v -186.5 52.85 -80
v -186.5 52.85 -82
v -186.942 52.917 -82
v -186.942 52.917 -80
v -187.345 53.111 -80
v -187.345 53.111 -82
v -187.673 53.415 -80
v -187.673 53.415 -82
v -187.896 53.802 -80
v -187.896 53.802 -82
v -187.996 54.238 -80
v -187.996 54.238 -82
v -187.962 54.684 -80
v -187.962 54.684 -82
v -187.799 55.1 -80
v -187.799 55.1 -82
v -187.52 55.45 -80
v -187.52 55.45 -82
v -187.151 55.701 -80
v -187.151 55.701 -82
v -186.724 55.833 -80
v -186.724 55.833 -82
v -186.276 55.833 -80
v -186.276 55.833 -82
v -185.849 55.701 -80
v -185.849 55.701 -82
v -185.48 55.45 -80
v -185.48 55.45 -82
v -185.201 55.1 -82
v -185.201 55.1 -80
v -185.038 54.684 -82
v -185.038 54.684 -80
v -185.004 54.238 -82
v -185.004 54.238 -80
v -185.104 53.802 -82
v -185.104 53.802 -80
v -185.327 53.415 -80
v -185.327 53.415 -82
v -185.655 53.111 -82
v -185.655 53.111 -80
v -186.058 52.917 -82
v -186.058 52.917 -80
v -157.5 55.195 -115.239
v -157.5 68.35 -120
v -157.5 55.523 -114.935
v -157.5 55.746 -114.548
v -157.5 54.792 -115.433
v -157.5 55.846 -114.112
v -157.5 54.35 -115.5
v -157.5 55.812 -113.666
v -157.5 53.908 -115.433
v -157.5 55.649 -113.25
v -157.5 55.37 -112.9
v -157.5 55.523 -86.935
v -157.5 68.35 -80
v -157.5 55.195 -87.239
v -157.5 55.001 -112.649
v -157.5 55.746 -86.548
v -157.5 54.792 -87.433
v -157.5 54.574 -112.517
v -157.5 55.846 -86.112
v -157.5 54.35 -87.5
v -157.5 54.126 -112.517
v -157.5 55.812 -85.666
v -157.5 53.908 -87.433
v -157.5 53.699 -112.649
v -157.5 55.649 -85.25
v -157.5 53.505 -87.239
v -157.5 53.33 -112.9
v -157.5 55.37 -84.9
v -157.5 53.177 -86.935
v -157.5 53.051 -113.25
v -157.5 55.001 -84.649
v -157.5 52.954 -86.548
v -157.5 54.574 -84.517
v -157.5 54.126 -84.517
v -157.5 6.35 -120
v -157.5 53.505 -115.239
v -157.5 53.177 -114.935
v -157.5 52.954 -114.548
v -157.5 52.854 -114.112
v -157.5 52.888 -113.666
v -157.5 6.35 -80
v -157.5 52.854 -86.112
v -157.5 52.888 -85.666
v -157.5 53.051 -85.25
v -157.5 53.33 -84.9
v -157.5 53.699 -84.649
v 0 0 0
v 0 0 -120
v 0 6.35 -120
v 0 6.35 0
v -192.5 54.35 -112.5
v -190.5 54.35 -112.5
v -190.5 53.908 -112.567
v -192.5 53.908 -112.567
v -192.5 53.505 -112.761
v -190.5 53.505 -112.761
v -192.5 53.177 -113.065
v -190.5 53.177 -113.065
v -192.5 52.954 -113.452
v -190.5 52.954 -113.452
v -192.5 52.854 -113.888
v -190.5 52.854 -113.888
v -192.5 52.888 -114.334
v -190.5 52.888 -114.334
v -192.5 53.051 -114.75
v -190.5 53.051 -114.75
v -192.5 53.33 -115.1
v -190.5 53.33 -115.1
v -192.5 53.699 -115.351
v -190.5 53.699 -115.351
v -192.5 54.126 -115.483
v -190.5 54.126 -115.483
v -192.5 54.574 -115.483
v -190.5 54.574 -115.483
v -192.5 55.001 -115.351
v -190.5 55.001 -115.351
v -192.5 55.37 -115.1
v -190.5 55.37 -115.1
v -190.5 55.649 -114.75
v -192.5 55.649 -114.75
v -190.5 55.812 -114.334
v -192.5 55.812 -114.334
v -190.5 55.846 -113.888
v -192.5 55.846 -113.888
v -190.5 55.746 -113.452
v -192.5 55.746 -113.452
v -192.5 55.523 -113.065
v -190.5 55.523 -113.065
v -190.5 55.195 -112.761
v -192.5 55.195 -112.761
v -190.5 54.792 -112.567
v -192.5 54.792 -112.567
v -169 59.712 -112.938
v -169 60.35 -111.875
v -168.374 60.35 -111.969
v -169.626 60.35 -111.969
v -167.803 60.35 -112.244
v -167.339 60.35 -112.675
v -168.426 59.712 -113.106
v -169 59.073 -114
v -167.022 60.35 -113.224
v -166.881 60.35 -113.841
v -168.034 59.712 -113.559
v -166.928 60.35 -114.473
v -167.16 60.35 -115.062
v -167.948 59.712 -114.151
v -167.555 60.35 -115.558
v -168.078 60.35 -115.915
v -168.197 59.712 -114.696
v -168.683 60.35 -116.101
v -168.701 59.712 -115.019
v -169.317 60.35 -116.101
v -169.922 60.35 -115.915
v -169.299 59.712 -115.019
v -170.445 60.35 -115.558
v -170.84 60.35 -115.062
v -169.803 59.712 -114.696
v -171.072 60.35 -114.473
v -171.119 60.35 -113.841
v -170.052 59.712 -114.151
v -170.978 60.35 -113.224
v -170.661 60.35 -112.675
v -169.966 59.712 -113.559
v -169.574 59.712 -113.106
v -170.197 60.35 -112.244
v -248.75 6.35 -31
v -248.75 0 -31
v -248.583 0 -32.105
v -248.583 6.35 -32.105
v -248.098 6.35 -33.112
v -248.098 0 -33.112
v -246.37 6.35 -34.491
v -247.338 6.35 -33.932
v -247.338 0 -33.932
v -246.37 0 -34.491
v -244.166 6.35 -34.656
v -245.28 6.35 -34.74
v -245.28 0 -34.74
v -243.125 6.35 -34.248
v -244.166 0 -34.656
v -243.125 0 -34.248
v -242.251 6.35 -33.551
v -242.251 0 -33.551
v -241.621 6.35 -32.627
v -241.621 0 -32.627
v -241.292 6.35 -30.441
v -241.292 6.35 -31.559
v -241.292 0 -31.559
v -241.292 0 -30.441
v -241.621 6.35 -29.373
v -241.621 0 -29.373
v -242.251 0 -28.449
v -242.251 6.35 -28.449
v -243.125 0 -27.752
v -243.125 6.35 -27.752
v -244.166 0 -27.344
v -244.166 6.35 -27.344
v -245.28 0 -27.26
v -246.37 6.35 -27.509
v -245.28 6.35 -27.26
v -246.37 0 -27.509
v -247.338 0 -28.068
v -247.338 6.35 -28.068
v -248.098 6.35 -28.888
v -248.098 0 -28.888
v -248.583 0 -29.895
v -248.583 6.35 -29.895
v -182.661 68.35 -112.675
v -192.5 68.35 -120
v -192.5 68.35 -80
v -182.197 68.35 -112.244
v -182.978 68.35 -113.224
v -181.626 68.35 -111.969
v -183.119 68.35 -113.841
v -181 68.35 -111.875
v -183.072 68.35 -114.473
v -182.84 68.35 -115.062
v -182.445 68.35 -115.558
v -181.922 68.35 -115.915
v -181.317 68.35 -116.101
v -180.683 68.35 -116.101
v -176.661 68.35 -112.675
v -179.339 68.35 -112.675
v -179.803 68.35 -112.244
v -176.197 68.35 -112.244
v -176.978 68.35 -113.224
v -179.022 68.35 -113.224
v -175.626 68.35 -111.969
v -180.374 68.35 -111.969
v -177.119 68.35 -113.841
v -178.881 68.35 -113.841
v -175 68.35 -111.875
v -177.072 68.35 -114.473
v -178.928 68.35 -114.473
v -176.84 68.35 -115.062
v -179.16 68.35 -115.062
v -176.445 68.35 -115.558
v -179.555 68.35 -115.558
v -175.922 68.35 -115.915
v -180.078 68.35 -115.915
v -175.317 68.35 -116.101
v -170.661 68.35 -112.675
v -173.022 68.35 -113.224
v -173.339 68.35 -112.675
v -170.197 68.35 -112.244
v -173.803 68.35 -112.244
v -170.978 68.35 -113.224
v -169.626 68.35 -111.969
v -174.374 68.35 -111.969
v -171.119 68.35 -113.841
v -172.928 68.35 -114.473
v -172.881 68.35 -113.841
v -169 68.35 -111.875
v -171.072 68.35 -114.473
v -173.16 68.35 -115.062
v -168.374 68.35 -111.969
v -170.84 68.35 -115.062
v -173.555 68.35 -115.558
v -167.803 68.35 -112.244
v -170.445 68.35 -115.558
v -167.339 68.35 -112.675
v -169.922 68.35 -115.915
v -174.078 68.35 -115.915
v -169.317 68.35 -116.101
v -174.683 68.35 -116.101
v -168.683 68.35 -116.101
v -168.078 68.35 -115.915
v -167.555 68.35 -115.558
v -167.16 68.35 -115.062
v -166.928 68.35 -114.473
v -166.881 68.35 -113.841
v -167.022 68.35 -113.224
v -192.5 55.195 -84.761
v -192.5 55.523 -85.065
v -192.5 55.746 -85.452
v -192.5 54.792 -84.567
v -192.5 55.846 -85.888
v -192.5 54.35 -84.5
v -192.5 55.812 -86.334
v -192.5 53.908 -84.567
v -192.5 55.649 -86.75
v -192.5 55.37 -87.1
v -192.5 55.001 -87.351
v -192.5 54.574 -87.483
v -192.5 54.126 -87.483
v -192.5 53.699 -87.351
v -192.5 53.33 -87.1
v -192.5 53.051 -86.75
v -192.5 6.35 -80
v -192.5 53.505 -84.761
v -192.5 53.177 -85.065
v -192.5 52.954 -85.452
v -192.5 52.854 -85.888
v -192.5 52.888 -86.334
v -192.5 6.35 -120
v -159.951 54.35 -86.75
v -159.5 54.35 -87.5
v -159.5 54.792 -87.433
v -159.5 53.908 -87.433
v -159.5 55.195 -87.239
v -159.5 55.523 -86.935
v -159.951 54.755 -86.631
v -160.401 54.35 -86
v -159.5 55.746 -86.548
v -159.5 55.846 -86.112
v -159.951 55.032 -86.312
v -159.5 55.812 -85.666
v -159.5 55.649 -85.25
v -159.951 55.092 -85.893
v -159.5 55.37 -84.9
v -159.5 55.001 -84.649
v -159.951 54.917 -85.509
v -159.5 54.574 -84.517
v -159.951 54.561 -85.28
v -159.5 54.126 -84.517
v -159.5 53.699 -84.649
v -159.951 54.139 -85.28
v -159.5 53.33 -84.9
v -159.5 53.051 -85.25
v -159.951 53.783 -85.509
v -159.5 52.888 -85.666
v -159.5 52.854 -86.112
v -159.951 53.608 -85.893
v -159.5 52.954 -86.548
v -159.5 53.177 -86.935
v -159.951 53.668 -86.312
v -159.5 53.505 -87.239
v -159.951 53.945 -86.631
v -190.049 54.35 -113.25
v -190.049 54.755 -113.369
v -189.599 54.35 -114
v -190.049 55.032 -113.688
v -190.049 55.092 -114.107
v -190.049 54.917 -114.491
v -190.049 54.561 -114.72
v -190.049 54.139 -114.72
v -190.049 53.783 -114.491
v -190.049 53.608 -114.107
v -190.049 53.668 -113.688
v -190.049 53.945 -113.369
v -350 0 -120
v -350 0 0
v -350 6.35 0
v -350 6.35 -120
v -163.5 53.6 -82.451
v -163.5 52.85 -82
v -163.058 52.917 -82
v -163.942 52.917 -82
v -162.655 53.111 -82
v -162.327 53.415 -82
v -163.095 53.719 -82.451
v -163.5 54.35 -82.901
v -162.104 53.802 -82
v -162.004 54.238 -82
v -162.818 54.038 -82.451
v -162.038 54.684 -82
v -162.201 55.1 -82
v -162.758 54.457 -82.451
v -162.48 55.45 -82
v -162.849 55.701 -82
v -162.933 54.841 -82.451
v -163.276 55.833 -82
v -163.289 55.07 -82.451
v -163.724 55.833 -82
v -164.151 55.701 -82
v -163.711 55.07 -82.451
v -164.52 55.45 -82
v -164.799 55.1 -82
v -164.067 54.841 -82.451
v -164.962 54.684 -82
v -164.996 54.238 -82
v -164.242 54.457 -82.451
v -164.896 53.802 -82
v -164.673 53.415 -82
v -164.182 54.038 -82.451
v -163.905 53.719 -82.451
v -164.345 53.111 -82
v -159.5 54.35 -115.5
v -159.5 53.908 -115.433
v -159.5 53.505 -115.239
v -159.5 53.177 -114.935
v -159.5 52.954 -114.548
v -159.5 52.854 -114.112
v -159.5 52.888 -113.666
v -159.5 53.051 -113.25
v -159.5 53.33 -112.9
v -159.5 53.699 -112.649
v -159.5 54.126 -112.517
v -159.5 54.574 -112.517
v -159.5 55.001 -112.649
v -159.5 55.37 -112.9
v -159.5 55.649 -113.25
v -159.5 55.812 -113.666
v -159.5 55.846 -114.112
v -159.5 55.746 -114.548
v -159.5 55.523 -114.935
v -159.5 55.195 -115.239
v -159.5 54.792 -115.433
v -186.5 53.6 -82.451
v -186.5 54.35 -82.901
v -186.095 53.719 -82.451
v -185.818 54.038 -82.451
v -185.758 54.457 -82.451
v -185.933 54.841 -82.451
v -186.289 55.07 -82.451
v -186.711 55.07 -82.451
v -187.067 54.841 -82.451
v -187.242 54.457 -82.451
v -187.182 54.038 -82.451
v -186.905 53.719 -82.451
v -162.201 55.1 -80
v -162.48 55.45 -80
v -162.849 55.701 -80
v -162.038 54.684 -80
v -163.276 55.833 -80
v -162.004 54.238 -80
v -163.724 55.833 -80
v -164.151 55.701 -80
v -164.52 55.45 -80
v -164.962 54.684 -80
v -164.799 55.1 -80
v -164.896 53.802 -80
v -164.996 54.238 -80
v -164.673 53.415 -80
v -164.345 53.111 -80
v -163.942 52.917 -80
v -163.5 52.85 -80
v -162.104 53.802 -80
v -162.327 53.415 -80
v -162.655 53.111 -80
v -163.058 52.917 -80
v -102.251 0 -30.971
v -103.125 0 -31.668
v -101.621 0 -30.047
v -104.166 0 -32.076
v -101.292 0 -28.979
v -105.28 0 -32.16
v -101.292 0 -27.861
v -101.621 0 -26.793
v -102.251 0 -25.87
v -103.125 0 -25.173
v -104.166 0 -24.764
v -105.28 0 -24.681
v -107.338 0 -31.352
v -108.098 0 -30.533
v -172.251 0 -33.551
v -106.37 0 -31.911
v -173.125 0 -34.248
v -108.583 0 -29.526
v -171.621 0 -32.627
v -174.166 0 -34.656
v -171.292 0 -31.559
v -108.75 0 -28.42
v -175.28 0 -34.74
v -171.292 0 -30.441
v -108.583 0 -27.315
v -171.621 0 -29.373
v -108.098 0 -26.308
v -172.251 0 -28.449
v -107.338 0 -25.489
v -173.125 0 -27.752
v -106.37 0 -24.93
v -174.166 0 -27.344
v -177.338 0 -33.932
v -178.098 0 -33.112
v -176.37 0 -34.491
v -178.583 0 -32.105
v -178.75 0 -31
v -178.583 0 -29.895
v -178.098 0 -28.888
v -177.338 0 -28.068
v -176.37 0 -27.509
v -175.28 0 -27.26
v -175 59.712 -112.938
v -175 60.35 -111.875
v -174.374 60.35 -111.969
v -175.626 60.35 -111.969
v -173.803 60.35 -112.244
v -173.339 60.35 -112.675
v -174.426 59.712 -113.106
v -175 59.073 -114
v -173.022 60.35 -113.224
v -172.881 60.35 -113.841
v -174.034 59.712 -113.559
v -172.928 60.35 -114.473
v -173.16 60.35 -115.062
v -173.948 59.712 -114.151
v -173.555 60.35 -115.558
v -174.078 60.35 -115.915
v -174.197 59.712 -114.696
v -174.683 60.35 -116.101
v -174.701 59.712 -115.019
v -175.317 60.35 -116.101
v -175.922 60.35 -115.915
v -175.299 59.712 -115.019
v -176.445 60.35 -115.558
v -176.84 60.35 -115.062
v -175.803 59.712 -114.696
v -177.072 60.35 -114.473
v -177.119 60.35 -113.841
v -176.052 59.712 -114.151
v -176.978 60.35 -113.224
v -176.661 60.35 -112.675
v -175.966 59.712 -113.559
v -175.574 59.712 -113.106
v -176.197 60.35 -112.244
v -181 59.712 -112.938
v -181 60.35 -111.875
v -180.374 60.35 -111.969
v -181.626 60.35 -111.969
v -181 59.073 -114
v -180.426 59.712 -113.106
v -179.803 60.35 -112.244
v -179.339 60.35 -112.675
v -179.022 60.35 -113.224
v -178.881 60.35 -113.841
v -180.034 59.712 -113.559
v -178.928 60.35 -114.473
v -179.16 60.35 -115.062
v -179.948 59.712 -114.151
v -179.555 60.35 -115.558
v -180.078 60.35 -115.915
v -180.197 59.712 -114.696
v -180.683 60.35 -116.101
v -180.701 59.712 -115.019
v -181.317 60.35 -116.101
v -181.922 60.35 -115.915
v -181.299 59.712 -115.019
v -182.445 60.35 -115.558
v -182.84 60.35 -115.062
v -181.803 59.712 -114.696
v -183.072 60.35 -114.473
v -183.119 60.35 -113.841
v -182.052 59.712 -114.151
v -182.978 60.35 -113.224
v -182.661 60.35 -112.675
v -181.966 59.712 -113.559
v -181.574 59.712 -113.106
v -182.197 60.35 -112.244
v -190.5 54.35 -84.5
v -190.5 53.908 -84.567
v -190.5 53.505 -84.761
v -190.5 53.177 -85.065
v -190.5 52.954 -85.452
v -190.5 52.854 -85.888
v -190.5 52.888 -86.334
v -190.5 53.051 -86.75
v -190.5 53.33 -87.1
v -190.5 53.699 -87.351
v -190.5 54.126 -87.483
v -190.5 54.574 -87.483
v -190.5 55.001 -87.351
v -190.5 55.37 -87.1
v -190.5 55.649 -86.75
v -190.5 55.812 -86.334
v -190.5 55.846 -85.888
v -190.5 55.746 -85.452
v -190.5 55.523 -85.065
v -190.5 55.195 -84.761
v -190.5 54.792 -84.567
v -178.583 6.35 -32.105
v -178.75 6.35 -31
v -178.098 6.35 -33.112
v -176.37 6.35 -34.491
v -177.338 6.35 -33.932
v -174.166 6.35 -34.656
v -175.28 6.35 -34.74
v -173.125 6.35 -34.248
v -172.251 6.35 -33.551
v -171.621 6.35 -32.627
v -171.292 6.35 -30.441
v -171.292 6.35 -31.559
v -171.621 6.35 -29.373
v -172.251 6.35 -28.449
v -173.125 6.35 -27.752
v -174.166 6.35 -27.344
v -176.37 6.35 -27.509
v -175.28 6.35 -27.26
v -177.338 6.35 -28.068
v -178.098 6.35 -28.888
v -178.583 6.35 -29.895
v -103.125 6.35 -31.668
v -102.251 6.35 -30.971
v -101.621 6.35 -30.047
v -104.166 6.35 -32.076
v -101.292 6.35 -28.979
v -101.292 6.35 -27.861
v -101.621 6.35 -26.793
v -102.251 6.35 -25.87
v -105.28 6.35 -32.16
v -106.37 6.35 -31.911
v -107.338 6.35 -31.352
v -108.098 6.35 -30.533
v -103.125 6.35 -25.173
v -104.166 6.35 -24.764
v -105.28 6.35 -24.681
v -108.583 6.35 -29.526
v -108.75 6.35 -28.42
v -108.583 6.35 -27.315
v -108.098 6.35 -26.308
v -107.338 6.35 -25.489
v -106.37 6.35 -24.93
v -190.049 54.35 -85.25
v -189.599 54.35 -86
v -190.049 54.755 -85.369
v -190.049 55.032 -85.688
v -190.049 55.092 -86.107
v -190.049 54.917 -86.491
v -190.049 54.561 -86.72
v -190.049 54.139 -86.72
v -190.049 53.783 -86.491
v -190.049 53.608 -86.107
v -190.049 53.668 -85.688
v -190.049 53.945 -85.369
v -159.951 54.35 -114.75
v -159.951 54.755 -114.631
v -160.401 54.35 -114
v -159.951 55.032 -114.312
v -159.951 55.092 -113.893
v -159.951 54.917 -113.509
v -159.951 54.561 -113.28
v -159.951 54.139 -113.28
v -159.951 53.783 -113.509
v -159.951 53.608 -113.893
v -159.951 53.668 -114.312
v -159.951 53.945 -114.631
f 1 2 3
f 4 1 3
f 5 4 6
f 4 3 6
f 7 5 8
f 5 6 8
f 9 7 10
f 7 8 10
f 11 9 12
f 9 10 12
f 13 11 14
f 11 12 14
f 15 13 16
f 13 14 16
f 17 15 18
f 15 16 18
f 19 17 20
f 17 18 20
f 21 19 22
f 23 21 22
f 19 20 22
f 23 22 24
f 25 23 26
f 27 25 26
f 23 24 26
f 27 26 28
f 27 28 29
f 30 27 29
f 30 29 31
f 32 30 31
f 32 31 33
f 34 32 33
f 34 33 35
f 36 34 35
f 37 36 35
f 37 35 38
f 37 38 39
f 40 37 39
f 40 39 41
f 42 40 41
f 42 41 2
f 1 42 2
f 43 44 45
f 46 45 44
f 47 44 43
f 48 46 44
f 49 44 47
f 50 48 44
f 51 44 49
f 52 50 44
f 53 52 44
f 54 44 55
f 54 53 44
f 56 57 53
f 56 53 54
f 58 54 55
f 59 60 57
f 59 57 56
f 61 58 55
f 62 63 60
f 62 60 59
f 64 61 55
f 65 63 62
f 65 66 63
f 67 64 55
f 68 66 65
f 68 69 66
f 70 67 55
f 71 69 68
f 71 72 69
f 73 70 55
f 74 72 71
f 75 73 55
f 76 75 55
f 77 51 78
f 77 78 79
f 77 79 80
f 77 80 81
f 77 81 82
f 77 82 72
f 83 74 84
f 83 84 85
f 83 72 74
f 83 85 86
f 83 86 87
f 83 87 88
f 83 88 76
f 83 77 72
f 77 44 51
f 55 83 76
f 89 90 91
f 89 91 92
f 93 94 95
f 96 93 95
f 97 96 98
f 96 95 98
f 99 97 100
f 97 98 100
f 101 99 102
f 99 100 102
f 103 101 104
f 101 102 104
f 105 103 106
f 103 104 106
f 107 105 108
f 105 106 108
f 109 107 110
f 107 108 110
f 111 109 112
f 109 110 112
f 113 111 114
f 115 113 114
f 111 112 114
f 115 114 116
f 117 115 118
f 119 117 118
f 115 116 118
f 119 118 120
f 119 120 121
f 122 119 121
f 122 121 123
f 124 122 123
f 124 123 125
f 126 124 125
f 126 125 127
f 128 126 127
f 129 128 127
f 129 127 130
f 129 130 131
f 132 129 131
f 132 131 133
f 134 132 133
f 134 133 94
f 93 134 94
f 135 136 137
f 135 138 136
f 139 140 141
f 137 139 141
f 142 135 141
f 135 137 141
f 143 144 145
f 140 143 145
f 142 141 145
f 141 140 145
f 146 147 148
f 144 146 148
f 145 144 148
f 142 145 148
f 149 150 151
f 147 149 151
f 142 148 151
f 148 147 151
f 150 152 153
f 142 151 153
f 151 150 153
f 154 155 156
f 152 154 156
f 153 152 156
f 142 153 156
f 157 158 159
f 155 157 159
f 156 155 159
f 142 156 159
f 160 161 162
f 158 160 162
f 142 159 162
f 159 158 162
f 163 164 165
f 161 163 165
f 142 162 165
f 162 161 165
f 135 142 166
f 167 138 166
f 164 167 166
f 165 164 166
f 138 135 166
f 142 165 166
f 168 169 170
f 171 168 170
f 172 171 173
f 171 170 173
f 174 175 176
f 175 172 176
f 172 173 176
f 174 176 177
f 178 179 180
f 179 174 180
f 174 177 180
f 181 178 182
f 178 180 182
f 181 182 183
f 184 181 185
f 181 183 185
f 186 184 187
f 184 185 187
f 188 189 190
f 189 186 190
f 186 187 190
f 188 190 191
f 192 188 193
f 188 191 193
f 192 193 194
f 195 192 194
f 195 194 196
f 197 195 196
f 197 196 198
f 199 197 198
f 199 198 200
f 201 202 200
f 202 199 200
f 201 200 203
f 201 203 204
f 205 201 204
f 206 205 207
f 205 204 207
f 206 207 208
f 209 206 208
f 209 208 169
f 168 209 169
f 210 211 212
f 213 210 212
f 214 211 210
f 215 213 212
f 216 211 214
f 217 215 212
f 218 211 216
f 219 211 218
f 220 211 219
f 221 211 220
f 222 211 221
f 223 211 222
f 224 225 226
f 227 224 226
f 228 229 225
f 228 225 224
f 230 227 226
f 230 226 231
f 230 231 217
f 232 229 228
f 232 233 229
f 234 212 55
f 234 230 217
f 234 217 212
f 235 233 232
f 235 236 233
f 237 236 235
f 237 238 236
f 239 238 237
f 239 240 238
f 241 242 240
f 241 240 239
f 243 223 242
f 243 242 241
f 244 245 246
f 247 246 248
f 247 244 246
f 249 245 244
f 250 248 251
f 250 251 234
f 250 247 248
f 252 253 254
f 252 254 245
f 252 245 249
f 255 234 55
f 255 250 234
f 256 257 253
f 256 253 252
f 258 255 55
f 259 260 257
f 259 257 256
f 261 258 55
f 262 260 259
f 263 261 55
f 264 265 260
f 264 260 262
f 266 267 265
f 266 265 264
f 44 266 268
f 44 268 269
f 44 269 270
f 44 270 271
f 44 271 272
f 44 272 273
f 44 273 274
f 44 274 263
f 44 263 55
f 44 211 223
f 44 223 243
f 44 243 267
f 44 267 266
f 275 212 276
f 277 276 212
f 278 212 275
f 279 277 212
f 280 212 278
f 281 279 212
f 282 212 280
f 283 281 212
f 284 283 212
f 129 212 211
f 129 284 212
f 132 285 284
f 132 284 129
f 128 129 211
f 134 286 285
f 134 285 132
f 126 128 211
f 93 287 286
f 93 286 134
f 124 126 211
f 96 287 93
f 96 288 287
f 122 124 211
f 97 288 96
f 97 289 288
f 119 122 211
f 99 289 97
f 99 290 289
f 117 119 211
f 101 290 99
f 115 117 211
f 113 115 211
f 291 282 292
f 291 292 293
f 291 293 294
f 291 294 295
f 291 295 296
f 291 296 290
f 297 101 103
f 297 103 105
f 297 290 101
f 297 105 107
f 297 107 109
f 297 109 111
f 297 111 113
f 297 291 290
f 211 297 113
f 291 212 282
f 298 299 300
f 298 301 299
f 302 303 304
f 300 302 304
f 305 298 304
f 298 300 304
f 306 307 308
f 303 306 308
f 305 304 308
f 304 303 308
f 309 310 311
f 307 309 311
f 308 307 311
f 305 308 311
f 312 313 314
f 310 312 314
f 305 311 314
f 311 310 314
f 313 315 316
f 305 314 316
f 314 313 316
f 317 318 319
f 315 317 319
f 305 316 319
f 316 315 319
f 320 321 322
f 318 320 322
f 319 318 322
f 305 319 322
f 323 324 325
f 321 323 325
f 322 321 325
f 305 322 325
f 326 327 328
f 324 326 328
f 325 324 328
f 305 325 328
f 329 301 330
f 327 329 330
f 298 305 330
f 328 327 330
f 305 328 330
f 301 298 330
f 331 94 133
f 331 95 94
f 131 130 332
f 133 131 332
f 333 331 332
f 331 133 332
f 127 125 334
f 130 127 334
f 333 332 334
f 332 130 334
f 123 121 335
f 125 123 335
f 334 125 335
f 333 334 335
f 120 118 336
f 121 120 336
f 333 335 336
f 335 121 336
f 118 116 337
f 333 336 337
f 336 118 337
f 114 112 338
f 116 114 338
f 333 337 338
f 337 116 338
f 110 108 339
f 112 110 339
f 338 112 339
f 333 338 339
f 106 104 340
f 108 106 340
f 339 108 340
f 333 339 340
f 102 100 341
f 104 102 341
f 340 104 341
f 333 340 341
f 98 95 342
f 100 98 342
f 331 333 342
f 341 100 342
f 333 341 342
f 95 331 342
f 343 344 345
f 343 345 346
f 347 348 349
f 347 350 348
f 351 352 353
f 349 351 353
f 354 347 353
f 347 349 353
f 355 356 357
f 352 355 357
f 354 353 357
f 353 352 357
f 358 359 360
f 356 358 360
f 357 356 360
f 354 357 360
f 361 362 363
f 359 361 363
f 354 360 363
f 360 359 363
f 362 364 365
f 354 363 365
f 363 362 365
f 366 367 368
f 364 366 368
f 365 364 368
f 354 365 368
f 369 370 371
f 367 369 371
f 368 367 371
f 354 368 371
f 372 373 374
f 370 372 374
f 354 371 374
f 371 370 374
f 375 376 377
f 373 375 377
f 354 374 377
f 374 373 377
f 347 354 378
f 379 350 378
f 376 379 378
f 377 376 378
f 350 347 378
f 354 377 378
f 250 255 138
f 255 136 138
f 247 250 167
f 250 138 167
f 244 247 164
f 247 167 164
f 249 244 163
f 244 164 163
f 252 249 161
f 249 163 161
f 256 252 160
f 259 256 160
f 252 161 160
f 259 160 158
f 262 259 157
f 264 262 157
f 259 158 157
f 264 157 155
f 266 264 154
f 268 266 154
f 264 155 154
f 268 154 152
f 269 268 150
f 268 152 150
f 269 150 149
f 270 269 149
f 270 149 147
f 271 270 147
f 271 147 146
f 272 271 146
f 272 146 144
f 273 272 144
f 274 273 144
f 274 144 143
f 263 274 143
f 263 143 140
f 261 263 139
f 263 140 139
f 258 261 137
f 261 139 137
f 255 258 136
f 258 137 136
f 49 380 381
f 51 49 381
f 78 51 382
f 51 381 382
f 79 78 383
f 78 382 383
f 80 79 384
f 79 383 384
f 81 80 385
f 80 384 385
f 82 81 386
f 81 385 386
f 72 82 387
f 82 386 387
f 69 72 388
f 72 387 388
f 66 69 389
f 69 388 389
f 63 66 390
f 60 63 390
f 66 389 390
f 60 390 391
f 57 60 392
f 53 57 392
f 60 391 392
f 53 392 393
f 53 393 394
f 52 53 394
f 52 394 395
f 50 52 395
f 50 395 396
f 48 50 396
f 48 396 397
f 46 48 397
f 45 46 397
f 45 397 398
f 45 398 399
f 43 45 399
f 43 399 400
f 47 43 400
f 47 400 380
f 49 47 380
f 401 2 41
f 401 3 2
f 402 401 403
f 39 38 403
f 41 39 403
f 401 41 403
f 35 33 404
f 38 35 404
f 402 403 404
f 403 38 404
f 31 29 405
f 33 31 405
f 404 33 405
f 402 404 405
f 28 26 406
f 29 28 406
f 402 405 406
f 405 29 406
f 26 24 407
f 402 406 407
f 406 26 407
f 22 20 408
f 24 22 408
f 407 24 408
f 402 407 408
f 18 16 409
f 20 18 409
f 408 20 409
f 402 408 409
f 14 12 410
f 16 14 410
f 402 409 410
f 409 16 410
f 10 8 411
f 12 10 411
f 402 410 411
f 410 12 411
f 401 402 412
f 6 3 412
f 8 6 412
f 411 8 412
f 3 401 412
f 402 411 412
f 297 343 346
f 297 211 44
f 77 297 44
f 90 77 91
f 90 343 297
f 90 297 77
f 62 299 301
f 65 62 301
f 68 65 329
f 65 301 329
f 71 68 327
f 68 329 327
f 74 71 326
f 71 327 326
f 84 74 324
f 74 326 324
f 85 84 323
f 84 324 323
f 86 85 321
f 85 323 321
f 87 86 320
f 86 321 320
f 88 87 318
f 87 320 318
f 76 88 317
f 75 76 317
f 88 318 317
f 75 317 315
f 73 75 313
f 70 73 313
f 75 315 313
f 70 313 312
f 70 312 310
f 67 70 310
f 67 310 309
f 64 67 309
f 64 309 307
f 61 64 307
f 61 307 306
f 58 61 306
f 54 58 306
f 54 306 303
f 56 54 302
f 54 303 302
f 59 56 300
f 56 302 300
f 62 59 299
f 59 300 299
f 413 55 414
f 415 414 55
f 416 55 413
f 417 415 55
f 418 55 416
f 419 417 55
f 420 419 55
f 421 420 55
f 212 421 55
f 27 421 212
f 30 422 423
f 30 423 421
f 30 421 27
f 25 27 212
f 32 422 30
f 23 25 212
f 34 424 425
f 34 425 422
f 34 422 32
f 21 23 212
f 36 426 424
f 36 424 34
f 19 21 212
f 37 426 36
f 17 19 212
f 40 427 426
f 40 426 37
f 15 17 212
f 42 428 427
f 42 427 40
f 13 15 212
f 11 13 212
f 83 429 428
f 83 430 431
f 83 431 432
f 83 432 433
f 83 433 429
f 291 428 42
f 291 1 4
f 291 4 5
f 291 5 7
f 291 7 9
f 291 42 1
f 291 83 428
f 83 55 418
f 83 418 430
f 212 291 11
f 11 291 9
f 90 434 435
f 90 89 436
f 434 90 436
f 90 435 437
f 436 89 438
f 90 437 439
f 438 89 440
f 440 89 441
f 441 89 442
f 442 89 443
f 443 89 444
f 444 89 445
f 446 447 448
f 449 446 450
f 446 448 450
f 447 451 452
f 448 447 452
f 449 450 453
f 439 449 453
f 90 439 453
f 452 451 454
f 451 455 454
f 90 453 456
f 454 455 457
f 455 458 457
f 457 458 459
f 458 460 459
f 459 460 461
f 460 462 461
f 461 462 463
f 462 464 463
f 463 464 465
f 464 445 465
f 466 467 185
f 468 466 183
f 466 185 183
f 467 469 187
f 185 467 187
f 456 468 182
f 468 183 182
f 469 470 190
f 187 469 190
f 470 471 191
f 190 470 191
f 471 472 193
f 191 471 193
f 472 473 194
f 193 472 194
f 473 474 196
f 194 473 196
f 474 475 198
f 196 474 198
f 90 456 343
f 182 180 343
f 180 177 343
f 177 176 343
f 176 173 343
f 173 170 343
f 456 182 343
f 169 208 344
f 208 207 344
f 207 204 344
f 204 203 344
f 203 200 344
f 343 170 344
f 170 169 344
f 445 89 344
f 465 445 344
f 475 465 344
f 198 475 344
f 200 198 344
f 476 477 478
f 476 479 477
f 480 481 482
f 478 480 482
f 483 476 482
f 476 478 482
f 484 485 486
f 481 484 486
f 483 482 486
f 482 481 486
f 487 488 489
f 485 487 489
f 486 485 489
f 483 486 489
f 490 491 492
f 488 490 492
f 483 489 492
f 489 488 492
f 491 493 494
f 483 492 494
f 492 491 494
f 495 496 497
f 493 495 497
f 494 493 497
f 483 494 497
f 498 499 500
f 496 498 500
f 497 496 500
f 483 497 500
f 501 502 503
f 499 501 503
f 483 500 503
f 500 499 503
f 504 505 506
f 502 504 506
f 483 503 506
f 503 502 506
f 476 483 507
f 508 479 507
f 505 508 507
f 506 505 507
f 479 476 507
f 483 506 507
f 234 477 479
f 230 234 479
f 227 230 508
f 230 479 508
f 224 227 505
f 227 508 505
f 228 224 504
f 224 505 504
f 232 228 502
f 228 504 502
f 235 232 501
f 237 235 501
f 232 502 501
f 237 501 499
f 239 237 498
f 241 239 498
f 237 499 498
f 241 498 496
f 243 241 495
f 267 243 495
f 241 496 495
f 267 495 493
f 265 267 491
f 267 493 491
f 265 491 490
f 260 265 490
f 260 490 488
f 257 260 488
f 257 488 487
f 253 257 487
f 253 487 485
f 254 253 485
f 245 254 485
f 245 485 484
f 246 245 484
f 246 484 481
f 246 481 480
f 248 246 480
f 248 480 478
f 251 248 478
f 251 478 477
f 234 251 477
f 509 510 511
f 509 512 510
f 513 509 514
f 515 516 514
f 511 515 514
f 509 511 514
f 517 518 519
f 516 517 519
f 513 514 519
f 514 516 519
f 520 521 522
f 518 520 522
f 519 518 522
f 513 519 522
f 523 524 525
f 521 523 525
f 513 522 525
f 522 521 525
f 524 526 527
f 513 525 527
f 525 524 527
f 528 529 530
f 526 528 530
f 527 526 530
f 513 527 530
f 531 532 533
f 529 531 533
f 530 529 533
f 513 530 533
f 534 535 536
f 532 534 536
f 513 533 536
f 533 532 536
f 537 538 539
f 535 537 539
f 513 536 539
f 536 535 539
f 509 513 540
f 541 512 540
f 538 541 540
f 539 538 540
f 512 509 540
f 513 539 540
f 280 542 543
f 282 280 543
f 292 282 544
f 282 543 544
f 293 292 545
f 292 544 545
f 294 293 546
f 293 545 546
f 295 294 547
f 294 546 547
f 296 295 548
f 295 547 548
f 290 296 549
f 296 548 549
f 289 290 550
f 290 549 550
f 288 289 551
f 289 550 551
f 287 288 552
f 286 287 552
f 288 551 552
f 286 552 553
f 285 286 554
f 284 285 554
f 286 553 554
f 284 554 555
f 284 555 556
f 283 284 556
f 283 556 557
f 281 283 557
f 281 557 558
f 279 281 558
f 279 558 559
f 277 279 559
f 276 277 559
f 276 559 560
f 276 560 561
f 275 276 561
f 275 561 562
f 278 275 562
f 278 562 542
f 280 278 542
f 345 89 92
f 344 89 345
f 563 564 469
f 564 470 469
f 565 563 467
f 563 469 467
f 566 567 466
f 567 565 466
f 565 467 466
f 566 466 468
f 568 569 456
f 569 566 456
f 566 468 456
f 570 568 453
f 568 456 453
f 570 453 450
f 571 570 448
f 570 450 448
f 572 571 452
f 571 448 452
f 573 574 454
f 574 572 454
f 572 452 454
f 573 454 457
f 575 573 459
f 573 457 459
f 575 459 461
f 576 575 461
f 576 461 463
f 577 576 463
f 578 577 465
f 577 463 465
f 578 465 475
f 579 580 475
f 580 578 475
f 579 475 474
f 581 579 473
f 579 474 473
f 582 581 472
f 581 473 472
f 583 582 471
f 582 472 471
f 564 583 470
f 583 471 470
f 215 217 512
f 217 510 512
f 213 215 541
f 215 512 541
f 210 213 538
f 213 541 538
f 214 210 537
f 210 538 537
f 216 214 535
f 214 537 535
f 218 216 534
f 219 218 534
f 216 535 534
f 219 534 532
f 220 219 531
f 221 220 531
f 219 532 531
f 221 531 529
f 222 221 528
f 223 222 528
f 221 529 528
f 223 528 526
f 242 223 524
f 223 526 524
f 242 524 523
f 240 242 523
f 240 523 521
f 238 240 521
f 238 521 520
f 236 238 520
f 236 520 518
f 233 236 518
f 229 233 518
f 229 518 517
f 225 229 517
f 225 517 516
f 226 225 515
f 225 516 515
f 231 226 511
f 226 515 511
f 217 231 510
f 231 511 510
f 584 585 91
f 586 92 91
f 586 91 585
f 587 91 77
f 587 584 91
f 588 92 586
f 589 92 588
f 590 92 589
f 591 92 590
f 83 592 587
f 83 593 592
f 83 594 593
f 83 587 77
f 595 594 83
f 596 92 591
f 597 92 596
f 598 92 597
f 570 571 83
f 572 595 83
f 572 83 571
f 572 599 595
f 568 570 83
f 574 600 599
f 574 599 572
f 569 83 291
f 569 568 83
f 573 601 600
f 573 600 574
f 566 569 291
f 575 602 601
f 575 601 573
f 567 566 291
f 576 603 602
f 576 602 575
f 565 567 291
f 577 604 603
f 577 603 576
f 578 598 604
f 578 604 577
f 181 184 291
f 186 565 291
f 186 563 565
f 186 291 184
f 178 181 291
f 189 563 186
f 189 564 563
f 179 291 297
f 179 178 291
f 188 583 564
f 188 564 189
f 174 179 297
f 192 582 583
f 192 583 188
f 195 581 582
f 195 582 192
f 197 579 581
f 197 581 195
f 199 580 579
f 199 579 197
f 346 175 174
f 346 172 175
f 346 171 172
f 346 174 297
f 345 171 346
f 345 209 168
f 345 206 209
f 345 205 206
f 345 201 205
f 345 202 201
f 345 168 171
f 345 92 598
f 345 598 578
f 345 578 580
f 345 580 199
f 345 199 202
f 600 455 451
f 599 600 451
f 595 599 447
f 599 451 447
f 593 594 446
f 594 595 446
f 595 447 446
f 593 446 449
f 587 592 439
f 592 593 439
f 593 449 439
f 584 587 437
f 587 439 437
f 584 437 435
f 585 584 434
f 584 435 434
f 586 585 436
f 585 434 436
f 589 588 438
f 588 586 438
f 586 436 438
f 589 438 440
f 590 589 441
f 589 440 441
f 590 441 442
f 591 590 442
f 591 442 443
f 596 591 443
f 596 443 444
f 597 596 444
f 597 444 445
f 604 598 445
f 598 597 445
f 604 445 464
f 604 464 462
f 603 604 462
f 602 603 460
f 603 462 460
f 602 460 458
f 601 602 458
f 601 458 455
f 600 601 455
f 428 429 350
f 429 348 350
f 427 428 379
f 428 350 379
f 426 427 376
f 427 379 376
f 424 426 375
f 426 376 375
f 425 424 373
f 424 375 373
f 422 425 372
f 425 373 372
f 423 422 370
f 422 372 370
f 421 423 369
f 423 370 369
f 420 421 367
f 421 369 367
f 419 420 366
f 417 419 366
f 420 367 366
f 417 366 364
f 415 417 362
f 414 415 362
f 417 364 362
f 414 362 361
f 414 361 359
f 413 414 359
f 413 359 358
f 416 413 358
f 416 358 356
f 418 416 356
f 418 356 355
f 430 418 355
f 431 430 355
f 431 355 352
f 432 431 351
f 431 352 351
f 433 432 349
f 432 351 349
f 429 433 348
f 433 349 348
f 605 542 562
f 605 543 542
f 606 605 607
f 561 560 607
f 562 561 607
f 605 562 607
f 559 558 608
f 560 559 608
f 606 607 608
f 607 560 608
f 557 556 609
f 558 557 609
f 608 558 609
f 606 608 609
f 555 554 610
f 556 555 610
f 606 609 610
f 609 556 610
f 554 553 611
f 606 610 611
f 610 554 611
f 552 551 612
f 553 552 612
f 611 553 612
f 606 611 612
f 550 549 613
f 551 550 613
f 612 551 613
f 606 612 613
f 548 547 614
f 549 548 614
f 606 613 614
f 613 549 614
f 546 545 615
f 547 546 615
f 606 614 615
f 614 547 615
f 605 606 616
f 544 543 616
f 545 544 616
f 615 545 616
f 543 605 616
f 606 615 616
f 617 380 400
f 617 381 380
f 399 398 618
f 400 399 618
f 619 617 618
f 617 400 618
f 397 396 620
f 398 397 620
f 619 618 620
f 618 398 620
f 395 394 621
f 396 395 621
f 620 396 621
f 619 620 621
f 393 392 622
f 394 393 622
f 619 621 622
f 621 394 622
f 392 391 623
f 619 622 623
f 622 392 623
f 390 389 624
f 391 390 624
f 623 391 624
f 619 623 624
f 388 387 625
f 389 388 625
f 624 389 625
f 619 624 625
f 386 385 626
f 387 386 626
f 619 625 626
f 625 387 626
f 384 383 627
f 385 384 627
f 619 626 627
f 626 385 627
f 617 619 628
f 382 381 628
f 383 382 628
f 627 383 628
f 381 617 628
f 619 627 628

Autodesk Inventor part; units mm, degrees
ref_plane "YZ Plane" through (0, 0, 0) normal (1, 0, 0) x (0, 1, 0)
ref_plane "XZ Plane" through (0, 0, 0) normal (0, 1, 0) x (-1, 0, 0)
ref_plane "XY Plane" through (0, 0, 0) normal (0, 0, 1) x (1, 0, 0)
sketch "Sketch1" plane through (0, 0, 0) normal (0, 1, 0) x (-1, 0, 0)
  line L0 (0, 0) -> (350, 0)
  line L1 (350, 0) -> (350, -120)
  line L2 (350, -120) -> (0, -120)
  line L3 (0, -120) -> (0, 0)
  circle A0 centre (175, -31) radius 3.75
  circle A1 centre (245, -31) radius 3.75
  circle A2 centre (105, -28.4204) radius 3.75
  dimension "d0" = 350
  dimension "d1" = 120
  dimension "d2" = 7.5
  dimension "d3" = 31
  dimension "d4" = 7.5
  dimension "d5" = 7.5
  dimension "d6" = 70
  dimension "d7" = 70
extrude "Extrusion1" add sketch "Sketch1" along normal blind 6.35
sketch "Sketch2" plane through (0, 6.35, 0) normal (0, 1, 0) x (1, 0, 0)
  line L0 (0, 120) -> (-350, 120) projected
  line L1 (-192.5, 120) -> (-157.5, 120)
  line L2 (-157.5, 120) -> (-157.5, 80)
  line L3 (-157.5, 80) -> (-192.5, 80)
  line L4 (-192.5, 80) -> (-192.5, 120)
  line L5 (0, 0) -> (0, 120) projected
  dimension "d10" = 35
  dimension "d11" = 40
  dimension "d12" = 157.5
extrude "Extrusion2" add sketch "Sketch2" along normal blind 62
sketch "Sketch3" plane through (0, 68.35, 0) normal (0, 1, 0) x (1, 0, 0)
  circle A0 centre (-175, 114) radius 2.125
  line L0 (-157.5, 120) -> (-192.5, 120) projected
  circle A1 centre (-169, 114) radius 2.125
  circle A2 centre (-181, 114) radius 2.125
  point P0 (0, 0)
  dimension "d15" = 4.25
  dimension "d16" = 6
  dimension "d17" = 4.25
  dimension "d18" = 6
  dimension "d19" = 4.25
  dimension "d20" = 6
hole "Hole1" at (-181, 68.35, -114) at (-175, 68.35, -114) at (-169, 68.35, -114) direction (0, -1, 0) diameter 4.25 depth 8 tip angle 118
sketch "Sketch4" plane through (-192.5, 6.35, -120) normal (-1, 0, 0) x (0, 0, 1)
  point P0 (120, -6.35)
sketch "Sketch5" plane through (-192.5, 6.35, -120) normal (-1, 0, 0) x (0, 0, 1)
  line L0 (0, 0) -> (0, 62) projected
  line L1 (0, 42) -> (40, 42)
  line L2 (40, 0) -> (40, 62) projected
  line L3 (0, 62) -> (40, 62) projected
  circle A0 centre (6, 48) radius 1.5
  circle A1 centre (34, 48) radius 1.5
  point P0 (120, -6.35)
  dimension "d28" = 20
  dimension "d29" = 3
  dimension "d30" = 3
  dimension "d31" = 6
  dimension "d32" = 6
  dimension "d33" = 6
  dimension "d34" = 6
hole "Hole2" at (-192.5, 54.35, -86) at (-192.5, 54.35, -114) direction (1, 0, 0) diameter 3 depth 2 tip angle 118
sketch "Sketch6" plane through (-192.5, 6.35, -80) normal (0, 0, 1) x (1, 0, 0)
  line L0 (0, 42) -> (35, 42)
  line L1 (0, 62) -> (35, 62) projected
  circle A0 centre (6, 48) radius 1.5
  line L2 (0, 0) -> (0, 62) projected
  circle A1 centre (29, 48) radius 1.5
  line L3 (35, 0) -> (35, 62) projected
  point P0 (192.5, -6.35)
  dimension "d42" = 20
  dimension "d43" = 3
  dimension "d44" = 6
  dimension "d45" = 6
  dimension "d46" = 3
  dimension "d47" = 6
  dimension "d48" = 6
hole "Hole3" at (-186.5, 54.35, -80) at (-163.5, 54.35, -80) direction (0, 0, -1) diameter 3 depth 2 tip angle 118
sketch "Sketch7" plane through (-157.5, 6.35, -80) normal (1, 0, 0) x (0, 0, -1)
  circle A0 centre (6, 48) radius 1.5 projected
  circle A1 centre (6, 48) radius 1.5
  circle A2 centre (34, 48) radius 1.5 projected
  circle A3 centre (34, 48) radius 1.5
  point P0 (-80, -6.35)
  dimension "d56" = 3
  dimension "d57" = 3
hole "Hole4" at (-157.5, 54.35, -86) at (-157.5, 54.35, -114) direction (-1, 0, 0) diameter 3 depth 2 tip angle 118
properties part number "Base" material "Wood (Birch)"
